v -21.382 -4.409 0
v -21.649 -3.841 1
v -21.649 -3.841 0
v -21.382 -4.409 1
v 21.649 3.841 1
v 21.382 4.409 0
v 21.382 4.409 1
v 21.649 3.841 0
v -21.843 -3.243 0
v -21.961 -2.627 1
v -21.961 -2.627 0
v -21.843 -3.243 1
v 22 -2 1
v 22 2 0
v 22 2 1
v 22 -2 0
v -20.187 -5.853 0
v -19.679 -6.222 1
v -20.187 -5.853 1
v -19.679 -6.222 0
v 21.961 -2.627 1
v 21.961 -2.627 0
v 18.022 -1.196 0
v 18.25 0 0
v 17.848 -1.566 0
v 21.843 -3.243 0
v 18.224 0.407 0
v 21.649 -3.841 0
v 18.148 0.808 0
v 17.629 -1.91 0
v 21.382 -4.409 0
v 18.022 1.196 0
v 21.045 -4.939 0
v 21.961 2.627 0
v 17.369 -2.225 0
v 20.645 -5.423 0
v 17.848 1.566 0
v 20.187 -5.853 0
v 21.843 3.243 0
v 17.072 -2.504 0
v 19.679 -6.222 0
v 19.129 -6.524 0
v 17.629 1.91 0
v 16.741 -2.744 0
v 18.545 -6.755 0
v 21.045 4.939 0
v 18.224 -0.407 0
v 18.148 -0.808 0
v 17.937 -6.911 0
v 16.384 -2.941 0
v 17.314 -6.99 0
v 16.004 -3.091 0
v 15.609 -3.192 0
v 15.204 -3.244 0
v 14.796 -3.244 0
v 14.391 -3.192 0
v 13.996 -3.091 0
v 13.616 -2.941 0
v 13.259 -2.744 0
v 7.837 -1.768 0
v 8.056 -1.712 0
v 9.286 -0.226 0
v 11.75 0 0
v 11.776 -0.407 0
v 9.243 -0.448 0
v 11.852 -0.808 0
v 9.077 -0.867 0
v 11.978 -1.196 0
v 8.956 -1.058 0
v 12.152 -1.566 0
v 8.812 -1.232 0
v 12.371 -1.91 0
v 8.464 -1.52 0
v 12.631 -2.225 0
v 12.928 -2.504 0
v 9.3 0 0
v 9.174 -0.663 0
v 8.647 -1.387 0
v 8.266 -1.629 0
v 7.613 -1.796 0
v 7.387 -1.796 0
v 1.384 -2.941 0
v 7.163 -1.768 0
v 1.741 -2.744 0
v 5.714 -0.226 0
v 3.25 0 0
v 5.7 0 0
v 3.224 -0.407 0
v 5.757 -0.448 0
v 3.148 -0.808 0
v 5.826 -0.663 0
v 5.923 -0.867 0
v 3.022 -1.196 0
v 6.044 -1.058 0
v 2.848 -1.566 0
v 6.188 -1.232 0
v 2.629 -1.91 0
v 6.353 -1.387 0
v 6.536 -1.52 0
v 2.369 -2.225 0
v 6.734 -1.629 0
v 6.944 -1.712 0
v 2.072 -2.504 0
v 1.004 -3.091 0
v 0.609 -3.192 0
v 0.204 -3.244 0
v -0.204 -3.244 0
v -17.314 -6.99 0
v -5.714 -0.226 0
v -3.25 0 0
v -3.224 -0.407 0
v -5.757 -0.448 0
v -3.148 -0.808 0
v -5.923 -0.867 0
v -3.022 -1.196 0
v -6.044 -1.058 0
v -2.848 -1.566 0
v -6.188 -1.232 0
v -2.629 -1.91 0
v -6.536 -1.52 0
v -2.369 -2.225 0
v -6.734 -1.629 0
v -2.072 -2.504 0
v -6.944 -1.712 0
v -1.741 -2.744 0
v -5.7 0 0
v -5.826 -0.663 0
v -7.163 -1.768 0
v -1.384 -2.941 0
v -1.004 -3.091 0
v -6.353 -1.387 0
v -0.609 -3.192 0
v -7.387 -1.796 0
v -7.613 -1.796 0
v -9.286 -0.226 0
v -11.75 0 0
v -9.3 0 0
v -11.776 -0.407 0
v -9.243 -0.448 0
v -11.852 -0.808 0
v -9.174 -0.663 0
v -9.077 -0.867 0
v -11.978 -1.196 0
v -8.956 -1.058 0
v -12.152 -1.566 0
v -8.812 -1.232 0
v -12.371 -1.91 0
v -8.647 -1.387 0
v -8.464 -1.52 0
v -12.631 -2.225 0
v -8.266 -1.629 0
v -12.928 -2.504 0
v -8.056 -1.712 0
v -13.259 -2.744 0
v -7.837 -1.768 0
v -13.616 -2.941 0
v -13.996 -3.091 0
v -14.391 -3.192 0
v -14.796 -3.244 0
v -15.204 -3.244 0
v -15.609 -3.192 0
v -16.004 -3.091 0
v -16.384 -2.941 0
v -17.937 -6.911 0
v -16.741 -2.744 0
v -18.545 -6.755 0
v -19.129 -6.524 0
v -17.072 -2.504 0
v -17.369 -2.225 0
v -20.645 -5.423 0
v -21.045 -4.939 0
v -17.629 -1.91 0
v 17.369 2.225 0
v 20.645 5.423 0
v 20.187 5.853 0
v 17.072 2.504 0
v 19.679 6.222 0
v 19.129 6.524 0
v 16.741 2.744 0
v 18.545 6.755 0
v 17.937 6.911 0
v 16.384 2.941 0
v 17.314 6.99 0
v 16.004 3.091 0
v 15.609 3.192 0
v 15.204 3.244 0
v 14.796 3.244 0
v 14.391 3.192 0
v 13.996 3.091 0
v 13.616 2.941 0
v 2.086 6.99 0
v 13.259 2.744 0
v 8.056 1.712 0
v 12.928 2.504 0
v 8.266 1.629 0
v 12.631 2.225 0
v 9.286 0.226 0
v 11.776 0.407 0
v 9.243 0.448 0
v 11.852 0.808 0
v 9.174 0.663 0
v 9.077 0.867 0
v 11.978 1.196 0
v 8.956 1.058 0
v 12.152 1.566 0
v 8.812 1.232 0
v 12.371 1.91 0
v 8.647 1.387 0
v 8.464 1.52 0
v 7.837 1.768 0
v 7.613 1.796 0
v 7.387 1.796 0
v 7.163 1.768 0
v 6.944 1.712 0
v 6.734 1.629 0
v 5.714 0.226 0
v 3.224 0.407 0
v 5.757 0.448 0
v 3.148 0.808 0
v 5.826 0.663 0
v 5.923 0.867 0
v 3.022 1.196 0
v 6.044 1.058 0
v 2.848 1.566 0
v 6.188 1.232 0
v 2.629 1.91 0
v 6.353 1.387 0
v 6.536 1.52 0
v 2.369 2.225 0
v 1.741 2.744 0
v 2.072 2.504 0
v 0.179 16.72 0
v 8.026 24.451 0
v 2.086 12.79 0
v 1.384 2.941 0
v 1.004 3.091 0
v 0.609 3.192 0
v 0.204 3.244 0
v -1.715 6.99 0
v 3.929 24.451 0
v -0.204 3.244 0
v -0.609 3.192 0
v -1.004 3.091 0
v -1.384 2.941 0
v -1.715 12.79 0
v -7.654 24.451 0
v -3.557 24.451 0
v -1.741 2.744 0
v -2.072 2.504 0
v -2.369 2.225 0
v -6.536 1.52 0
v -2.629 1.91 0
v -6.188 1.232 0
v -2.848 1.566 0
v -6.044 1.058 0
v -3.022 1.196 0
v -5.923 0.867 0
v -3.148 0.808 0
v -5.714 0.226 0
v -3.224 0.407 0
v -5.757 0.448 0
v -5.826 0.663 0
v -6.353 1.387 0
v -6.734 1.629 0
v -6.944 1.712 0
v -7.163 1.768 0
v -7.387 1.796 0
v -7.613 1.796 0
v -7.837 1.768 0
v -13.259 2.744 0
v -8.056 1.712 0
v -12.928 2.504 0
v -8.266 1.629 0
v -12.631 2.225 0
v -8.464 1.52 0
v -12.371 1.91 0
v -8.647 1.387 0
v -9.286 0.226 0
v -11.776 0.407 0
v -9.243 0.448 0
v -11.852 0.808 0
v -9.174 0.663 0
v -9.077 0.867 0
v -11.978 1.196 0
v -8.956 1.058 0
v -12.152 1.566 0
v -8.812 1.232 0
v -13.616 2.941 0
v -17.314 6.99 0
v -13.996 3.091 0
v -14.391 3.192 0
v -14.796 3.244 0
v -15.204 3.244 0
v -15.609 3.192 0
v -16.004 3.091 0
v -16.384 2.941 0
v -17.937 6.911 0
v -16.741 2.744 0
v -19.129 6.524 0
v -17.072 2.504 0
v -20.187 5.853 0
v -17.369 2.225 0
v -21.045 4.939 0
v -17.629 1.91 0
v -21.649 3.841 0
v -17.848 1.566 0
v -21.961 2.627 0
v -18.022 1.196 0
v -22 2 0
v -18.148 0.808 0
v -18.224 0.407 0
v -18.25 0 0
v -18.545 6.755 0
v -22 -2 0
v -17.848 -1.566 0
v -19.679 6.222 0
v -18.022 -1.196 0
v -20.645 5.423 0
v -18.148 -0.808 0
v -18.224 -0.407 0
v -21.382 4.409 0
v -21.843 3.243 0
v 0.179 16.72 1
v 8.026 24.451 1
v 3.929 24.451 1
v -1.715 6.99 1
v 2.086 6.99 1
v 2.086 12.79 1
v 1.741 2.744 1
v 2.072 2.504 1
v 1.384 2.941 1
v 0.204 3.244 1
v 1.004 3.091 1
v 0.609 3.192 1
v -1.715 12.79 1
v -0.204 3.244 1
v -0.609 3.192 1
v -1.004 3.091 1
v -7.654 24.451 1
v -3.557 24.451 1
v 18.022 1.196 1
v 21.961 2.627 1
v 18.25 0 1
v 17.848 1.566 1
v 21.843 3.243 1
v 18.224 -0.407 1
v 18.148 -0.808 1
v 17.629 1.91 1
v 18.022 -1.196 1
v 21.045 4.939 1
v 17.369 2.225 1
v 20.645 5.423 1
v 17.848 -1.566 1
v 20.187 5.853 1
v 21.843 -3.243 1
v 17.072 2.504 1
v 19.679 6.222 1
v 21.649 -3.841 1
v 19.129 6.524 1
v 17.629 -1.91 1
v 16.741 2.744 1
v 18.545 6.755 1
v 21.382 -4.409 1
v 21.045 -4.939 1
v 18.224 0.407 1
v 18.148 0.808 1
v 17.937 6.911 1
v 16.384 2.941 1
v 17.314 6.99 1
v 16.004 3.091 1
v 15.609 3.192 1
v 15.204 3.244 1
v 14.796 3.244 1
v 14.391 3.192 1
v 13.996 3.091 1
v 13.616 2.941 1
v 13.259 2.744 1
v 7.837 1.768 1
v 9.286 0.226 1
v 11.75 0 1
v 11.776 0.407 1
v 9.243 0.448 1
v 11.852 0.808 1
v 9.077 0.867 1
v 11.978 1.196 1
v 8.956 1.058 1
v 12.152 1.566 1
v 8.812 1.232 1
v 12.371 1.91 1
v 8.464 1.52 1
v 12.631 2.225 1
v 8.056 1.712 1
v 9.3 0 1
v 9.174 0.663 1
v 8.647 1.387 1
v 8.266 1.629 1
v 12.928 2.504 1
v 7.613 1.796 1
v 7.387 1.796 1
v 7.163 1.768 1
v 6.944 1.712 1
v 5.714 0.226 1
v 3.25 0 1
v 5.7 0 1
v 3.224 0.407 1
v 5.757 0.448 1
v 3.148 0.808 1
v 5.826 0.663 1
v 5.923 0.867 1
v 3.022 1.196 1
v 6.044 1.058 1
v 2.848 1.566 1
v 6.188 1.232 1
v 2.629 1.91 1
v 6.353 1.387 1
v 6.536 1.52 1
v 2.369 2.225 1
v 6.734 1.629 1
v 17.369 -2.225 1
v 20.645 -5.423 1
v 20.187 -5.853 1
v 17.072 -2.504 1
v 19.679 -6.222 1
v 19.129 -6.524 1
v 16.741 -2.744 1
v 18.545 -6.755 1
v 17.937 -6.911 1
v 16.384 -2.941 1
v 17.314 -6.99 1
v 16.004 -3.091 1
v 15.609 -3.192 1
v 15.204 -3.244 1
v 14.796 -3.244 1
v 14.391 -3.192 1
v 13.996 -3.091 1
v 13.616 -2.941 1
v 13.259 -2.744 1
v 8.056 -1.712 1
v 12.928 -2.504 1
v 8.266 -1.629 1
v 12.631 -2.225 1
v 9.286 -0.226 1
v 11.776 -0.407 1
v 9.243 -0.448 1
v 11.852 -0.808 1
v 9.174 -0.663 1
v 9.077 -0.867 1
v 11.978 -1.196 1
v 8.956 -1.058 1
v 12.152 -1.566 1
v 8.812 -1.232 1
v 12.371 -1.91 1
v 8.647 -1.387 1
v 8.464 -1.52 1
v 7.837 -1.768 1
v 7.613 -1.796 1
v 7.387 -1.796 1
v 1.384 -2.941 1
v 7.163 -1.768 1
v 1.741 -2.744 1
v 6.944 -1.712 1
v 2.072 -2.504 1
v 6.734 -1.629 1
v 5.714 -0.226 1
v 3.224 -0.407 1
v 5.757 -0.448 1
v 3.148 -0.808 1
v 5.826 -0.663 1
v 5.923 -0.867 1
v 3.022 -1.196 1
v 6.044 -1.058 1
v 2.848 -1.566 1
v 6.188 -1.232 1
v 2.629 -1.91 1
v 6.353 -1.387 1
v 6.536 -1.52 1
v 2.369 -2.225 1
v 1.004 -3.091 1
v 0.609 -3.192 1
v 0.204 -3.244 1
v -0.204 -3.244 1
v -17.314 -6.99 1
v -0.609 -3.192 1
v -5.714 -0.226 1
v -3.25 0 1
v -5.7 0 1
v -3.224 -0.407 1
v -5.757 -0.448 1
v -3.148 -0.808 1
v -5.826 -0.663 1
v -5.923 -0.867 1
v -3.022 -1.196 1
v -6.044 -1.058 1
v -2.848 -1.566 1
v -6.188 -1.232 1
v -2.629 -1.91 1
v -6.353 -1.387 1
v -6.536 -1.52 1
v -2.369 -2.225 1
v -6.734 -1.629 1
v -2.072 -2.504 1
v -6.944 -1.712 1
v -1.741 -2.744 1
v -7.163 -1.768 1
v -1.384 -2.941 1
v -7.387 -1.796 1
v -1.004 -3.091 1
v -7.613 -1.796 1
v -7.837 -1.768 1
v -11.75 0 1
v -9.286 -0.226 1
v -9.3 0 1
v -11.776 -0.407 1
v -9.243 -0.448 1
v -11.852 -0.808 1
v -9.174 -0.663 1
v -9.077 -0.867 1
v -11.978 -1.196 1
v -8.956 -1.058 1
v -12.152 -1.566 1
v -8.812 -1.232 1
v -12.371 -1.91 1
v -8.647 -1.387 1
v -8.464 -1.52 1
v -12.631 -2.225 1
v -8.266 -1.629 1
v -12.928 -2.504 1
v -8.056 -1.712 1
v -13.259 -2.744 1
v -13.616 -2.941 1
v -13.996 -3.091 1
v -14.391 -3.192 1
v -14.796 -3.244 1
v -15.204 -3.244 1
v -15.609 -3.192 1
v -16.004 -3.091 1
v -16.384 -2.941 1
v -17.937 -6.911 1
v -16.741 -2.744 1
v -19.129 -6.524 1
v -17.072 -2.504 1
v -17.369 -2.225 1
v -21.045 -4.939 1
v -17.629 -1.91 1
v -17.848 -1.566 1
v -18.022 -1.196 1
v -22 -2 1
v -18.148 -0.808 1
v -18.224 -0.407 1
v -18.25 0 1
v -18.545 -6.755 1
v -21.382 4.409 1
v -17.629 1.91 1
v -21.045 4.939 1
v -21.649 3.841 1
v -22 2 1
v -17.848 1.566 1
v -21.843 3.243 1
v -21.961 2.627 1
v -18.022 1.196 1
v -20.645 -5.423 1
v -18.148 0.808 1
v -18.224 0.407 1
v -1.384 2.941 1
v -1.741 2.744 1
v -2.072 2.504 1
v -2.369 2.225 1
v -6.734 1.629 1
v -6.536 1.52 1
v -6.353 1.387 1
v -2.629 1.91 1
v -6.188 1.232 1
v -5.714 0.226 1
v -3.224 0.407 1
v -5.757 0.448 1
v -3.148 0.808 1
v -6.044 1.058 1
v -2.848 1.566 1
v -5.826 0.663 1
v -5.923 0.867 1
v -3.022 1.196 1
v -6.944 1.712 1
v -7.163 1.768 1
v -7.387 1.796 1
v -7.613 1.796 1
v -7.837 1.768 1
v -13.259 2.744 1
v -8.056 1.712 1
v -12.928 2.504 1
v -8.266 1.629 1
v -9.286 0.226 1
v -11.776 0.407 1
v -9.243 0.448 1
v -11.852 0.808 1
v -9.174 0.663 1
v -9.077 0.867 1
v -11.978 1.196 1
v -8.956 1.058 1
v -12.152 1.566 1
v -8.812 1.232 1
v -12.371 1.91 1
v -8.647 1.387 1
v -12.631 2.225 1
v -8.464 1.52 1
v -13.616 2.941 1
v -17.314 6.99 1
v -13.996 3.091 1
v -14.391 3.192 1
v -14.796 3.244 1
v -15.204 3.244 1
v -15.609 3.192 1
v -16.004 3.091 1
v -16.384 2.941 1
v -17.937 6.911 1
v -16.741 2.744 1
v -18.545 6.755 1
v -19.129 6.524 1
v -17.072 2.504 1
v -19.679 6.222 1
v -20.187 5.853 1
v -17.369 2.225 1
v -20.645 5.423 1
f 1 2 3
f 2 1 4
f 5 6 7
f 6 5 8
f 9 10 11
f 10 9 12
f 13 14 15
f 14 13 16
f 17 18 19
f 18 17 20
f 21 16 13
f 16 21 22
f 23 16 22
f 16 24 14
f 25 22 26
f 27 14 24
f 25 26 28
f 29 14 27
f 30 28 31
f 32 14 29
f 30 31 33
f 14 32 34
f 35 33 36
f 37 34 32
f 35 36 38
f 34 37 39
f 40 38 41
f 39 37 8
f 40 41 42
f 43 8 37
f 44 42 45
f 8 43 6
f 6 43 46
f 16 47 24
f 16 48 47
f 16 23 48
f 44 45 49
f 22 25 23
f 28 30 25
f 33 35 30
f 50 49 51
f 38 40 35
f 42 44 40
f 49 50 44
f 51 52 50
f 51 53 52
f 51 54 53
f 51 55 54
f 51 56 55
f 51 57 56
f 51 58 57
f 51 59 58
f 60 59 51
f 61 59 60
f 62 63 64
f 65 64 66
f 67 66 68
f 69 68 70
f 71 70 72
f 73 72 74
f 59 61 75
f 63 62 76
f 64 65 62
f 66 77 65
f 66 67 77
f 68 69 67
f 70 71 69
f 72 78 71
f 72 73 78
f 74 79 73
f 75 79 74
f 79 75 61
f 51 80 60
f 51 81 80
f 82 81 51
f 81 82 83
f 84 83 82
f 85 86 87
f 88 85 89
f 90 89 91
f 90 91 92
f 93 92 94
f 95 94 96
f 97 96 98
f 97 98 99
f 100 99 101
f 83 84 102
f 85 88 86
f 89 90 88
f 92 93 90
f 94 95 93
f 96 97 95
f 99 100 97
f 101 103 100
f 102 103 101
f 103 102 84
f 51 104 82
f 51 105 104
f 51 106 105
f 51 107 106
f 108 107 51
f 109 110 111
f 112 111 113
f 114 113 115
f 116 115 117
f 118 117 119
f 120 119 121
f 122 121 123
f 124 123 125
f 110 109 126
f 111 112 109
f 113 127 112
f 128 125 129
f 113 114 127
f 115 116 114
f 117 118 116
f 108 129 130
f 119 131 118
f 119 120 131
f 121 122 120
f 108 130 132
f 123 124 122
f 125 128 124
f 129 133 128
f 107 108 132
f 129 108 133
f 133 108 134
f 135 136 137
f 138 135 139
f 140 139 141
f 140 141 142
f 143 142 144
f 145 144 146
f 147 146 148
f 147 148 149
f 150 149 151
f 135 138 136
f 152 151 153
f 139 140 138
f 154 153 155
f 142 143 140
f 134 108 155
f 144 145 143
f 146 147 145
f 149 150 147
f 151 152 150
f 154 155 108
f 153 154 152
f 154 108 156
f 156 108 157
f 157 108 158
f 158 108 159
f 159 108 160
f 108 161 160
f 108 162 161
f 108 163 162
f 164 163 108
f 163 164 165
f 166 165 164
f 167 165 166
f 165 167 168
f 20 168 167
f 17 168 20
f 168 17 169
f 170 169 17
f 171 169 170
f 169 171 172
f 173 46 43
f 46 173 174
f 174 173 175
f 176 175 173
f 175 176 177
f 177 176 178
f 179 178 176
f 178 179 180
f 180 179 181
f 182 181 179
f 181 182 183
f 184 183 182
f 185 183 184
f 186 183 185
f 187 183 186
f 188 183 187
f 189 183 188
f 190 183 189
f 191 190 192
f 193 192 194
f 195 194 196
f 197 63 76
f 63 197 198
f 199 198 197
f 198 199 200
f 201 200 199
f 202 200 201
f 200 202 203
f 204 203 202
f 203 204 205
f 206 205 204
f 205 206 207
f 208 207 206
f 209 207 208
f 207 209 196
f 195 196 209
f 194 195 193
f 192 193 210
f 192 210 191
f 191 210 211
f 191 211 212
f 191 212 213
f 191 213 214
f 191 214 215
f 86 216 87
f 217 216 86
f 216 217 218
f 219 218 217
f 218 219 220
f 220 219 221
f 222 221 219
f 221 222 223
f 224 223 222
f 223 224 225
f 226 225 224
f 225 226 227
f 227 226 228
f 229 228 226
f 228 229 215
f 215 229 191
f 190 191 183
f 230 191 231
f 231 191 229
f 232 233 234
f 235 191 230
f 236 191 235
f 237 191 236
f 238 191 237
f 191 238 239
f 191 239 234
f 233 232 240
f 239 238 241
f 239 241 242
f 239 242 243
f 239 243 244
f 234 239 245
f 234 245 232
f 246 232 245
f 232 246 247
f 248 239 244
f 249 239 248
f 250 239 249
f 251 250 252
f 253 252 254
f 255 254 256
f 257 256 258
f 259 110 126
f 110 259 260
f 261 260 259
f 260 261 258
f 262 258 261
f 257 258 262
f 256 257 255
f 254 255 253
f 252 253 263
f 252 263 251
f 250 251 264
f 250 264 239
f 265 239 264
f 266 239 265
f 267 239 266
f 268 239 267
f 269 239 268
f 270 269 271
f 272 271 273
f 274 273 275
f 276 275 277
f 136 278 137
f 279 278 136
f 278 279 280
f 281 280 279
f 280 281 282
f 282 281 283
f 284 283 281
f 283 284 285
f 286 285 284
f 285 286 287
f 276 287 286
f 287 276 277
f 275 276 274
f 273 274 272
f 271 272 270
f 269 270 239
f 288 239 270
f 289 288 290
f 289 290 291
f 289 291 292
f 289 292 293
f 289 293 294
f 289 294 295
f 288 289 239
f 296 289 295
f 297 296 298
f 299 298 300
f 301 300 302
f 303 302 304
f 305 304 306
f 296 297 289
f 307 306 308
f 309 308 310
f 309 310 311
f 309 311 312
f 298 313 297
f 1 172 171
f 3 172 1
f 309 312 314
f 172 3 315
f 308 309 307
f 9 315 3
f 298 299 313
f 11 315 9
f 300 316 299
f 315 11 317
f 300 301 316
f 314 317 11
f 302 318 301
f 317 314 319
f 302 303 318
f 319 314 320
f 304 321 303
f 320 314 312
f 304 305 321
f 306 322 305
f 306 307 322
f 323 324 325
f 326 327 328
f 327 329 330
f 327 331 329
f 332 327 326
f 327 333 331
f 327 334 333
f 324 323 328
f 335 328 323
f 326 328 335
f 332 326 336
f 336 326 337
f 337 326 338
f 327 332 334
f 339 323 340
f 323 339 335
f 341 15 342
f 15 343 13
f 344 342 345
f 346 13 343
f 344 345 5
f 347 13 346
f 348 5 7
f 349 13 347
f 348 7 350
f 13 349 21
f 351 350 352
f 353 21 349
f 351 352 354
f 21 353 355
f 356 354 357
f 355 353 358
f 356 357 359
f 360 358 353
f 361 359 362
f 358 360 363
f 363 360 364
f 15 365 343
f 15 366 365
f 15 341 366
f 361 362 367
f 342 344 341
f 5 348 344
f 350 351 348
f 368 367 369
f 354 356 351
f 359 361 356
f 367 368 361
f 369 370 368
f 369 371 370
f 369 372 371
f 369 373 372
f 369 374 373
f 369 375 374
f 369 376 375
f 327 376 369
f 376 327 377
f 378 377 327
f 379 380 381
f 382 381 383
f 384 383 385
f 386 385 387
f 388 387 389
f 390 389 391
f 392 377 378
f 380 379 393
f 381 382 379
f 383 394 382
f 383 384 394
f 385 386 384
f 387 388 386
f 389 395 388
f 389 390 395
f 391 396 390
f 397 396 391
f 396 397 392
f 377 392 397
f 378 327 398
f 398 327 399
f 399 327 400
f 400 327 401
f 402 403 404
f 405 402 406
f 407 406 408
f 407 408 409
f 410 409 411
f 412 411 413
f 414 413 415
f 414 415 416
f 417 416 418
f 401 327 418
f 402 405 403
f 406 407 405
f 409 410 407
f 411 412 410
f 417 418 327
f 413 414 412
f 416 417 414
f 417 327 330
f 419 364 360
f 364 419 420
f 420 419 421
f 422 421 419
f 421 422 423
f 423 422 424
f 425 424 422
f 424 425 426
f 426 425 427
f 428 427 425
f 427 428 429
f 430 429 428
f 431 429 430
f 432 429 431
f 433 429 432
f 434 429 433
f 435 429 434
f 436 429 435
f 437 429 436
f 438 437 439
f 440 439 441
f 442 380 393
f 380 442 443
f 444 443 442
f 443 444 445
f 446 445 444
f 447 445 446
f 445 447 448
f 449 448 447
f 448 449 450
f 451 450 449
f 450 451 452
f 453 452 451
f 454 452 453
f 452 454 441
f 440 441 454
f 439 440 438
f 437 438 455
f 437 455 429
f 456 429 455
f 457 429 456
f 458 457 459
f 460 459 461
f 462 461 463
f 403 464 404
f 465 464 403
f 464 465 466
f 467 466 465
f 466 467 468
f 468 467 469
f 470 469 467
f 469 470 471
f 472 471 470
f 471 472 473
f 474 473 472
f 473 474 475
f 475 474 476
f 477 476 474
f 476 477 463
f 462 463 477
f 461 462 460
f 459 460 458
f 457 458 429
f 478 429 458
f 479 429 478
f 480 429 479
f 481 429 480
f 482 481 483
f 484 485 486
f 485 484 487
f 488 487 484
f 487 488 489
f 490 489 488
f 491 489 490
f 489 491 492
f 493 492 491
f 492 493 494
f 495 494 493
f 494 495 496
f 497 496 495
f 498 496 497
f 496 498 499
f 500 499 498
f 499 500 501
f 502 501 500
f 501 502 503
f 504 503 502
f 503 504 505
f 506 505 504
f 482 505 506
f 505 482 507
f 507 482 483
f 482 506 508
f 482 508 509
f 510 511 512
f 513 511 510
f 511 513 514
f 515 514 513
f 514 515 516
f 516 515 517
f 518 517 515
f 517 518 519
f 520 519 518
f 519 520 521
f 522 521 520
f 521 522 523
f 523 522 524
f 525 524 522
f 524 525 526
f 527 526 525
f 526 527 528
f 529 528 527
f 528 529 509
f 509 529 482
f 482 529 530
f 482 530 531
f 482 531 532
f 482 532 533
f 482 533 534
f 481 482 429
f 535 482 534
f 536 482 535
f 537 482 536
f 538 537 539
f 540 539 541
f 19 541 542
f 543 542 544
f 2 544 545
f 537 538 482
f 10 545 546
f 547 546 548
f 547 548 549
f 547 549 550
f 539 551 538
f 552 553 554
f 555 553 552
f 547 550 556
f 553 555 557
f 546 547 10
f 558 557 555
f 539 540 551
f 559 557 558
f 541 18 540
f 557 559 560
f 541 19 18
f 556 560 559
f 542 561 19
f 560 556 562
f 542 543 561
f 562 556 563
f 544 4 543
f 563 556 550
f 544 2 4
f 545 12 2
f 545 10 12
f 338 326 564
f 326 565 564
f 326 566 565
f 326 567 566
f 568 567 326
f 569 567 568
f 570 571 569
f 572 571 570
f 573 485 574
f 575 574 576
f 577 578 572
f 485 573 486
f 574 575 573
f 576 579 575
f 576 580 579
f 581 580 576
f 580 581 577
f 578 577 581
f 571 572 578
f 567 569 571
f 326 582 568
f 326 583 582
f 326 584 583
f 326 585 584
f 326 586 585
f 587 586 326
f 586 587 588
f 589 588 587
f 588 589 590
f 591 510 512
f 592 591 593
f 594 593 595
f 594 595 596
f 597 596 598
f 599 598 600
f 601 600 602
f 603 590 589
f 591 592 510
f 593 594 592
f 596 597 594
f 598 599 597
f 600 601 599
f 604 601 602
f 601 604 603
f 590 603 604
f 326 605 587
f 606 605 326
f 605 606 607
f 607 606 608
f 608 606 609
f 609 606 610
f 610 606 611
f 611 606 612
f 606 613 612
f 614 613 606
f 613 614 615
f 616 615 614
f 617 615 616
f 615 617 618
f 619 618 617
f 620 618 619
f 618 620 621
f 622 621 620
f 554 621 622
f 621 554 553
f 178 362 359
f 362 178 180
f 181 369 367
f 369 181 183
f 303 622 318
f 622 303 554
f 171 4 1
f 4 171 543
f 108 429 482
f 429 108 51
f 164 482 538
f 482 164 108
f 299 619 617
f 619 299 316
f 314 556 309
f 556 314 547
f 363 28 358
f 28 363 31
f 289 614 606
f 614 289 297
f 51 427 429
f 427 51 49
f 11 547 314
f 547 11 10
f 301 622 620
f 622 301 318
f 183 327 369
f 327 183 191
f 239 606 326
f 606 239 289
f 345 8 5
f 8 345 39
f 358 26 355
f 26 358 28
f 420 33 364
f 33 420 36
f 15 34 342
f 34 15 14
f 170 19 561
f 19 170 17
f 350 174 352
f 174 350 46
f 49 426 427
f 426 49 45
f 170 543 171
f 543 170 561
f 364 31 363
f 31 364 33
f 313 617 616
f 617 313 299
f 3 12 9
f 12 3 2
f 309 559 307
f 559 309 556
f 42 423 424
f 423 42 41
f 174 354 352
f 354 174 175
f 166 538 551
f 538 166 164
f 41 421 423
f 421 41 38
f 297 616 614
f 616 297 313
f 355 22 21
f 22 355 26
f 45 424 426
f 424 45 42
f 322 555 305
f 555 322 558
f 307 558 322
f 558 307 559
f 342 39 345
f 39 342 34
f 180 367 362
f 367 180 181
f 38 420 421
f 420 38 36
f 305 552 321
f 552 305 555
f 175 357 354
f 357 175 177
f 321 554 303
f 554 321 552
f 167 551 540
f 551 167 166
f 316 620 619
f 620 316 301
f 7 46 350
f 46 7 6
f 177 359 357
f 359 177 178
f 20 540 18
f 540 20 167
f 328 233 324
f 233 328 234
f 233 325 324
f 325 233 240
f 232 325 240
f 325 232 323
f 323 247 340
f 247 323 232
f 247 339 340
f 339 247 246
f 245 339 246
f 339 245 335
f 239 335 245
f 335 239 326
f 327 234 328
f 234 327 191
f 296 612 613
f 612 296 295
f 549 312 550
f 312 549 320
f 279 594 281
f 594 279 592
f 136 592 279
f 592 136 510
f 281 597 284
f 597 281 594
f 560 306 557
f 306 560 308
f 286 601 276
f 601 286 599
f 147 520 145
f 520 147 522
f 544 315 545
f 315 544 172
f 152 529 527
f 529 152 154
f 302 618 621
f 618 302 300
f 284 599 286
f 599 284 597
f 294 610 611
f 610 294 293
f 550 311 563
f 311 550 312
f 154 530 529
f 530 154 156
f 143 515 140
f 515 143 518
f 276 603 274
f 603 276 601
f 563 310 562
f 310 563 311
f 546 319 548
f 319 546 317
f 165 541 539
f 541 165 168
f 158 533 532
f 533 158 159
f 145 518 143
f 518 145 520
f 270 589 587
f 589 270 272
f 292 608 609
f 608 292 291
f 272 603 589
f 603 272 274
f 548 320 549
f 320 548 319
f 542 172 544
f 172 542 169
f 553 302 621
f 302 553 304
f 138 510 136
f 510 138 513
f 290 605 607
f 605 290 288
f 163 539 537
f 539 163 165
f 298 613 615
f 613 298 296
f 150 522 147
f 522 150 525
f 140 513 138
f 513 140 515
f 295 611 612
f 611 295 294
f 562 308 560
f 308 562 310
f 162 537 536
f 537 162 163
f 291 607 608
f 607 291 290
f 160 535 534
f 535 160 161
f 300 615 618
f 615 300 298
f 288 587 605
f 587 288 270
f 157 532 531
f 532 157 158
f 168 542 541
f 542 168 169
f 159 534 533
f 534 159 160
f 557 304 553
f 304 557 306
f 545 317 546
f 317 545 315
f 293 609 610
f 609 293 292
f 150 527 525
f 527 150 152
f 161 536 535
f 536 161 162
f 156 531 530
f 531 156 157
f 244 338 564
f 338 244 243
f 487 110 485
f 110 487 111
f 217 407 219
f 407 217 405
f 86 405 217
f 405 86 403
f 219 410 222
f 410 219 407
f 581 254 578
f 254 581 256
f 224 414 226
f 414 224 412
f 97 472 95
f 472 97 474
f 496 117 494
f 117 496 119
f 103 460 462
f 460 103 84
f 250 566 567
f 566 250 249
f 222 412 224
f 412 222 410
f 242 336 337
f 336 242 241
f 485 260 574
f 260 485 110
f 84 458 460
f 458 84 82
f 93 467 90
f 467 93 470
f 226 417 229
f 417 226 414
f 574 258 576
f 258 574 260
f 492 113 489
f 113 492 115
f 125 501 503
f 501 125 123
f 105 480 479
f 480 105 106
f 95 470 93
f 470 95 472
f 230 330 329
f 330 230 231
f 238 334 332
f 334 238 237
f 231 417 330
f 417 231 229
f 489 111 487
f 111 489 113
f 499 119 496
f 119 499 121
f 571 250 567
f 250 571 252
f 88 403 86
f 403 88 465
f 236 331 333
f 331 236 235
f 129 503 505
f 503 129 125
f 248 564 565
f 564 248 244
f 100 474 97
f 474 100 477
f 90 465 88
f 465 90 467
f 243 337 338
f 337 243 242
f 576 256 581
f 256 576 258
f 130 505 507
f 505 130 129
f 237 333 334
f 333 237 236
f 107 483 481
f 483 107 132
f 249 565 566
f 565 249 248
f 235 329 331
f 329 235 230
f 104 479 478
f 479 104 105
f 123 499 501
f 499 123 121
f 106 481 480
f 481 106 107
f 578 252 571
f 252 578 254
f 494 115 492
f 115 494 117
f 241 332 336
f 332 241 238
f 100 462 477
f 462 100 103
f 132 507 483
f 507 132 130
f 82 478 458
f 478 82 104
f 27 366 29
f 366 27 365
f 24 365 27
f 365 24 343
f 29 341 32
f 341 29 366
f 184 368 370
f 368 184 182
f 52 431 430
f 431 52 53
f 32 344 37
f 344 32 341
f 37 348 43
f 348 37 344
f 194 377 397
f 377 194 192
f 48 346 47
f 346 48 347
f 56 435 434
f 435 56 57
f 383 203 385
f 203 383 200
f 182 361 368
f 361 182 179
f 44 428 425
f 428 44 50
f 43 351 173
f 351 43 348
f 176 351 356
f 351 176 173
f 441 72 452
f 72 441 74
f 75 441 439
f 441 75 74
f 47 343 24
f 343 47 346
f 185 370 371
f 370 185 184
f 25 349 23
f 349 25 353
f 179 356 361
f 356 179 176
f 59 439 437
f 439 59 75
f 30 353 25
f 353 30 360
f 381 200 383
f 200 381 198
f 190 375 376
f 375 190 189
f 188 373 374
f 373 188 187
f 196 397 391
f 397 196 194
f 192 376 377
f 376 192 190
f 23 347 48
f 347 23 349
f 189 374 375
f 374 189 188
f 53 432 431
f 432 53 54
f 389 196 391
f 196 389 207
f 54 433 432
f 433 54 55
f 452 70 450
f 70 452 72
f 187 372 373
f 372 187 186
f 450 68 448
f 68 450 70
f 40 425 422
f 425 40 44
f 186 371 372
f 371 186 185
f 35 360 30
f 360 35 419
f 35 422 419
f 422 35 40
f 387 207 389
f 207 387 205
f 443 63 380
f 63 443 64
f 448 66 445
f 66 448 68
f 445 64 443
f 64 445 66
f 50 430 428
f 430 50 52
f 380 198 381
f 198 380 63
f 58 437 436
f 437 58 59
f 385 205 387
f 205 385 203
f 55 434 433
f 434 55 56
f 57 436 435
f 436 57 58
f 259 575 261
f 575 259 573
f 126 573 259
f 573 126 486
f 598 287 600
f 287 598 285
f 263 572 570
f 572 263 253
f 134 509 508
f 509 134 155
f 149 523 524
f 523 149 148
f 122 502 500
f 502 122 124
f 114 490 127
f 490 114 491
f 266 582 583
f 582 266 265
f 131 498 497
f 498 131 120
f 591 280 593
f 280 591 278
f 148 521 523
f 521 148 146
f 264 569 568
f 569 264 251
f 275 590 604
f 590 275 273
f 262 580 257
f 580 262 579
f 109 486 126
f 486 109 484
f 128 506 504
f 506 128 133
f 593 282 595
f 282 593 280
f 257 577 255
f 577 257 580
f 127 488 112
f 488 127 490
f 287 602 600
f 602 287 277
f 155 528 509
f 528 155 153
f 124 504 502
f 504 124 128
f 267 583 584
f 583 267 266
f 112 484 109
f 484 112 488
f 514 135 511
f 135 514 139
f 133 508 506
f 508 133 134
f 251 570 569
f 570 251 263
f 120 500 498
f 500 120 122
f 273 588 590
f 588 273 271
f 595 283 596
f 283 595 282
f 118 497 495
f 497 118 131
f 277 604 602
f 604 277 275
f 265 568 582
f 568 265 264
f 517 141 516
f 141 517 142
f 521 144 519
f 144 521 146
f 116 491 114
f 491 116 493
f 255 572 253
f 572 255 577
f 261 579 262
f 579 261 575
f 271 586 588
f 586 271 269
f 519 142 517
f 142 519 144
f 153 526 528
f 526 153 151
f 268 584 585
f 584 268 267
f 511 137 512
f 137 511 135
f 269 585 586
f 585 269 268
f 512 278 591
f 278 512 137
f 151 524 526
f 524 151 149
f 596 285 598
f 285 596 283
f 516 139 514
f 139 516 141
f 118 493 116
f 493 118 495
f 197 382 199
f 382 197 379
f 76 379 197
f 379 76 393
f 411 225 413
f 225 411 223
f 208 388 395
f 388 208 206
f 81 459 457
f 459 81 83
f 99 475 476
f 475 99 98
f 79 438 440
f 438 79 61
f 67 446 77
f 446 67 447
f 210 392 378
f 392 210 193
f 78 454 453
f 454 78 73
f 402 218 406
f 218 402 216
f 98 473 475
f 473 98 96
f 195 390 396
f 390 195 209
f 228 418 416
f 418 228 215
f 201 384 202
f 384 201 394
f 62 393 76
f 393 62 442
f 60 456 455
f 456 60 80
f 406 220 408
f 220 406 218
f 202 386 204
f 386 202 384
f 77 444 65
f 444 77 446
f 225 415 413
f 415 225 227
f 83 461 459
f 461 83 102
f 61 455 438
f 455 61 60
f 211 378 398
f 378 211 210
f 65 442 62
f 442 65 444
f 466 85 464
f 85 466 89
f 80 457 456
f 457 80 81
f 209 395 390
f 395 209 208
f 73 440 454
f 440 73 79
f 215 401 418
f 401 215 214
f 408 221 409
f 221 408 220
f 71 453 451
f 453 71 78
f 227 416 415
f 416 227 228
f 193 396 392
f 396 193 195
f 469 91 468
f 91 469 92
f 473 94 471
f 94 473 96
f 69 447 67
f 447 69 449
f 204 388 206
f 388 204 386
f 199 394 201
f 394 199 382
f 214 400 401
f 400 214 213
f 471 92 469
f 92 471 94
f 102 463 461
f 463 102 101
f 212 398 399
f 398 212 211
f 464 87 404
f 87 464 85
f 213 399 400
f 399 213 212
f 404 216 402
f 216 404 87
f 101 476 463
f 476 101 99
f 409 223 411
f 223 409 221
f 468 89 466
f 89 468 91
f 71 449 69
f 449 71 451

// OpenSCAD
$fn = 50;


difference() {
	union() {
		hull() {
			translate(v = [-17.0000000000, 2.0000000000, 0]) {
				cylinder(h = 1, r = 5);
			}
			translate(v = [17.0000000000, 2.0000000000, 0]) {
				cylinder(h = 1, r = 5);
			}
			translate(v = [-17.0000000000, -2.0000000000, 0]) {
				cylinder(h = 1, r = 5);
			}
			translate(v = [17.0000000000, -2.0000000000, 0]) {
				cylinder(h = 1, r = 5);
			}
		}
		translate(v = [0, 24, 0]) {
			linear_extrude(height = 1) {
				text(font = "DejaVu Sans Mono:style=Bold", halign = "center", size = 19.0000000000, text = "Y", valign = "top");
			}
		}
	}
	union() {
		translate(v = [-15.0000000000, 0.0000000000, 0]) {
			translate(v = [0, 0, -100]) {
				cylinder(h = 200, r = 3.2500000000);
			}
		}
		translate(v = [0, 0, -100]) {
			cylinder(h = 200, r = 3.2500000000);
		}
		translate(v = [15.0000000000, 0.0000000000, 0]) {
			translate(v = [0, 0, -100]) {
				cylinder(h = 200, r = 3.2500000000);
			}
		}
		translate(v = [-15.0000000000, 0.0000000000, 0]) {
			translate(v = [0, 0, -100]) {
				cylinder(h = 200, r = 1.8000000000);
			}
		}
		translate(v = [-7.5000000000, 0.0000000000, 0]) {
			translate(v = [0, 0, -100]) {
				cylinder(h = 200, r = 1.8000000000);
			}
		}
		translate(v = [0, 0, -100]) {
			cylinder(h = 200, r = 1.8000000000);
		}
		translate(v = [7.5000000000, 0.0000000000, 0]) {
			translate(v = [0, 0, -100]) {
				cylinder(h = 200, r = 1.8000000000);
			}
		}
		translate(v = [15.0000000000, 0.0000000000, 0]) {
			translate(v = [0, 0, -100]) {
				cylinder(h = 200, r = 1.8000000000);
			}
		}
	}
}
